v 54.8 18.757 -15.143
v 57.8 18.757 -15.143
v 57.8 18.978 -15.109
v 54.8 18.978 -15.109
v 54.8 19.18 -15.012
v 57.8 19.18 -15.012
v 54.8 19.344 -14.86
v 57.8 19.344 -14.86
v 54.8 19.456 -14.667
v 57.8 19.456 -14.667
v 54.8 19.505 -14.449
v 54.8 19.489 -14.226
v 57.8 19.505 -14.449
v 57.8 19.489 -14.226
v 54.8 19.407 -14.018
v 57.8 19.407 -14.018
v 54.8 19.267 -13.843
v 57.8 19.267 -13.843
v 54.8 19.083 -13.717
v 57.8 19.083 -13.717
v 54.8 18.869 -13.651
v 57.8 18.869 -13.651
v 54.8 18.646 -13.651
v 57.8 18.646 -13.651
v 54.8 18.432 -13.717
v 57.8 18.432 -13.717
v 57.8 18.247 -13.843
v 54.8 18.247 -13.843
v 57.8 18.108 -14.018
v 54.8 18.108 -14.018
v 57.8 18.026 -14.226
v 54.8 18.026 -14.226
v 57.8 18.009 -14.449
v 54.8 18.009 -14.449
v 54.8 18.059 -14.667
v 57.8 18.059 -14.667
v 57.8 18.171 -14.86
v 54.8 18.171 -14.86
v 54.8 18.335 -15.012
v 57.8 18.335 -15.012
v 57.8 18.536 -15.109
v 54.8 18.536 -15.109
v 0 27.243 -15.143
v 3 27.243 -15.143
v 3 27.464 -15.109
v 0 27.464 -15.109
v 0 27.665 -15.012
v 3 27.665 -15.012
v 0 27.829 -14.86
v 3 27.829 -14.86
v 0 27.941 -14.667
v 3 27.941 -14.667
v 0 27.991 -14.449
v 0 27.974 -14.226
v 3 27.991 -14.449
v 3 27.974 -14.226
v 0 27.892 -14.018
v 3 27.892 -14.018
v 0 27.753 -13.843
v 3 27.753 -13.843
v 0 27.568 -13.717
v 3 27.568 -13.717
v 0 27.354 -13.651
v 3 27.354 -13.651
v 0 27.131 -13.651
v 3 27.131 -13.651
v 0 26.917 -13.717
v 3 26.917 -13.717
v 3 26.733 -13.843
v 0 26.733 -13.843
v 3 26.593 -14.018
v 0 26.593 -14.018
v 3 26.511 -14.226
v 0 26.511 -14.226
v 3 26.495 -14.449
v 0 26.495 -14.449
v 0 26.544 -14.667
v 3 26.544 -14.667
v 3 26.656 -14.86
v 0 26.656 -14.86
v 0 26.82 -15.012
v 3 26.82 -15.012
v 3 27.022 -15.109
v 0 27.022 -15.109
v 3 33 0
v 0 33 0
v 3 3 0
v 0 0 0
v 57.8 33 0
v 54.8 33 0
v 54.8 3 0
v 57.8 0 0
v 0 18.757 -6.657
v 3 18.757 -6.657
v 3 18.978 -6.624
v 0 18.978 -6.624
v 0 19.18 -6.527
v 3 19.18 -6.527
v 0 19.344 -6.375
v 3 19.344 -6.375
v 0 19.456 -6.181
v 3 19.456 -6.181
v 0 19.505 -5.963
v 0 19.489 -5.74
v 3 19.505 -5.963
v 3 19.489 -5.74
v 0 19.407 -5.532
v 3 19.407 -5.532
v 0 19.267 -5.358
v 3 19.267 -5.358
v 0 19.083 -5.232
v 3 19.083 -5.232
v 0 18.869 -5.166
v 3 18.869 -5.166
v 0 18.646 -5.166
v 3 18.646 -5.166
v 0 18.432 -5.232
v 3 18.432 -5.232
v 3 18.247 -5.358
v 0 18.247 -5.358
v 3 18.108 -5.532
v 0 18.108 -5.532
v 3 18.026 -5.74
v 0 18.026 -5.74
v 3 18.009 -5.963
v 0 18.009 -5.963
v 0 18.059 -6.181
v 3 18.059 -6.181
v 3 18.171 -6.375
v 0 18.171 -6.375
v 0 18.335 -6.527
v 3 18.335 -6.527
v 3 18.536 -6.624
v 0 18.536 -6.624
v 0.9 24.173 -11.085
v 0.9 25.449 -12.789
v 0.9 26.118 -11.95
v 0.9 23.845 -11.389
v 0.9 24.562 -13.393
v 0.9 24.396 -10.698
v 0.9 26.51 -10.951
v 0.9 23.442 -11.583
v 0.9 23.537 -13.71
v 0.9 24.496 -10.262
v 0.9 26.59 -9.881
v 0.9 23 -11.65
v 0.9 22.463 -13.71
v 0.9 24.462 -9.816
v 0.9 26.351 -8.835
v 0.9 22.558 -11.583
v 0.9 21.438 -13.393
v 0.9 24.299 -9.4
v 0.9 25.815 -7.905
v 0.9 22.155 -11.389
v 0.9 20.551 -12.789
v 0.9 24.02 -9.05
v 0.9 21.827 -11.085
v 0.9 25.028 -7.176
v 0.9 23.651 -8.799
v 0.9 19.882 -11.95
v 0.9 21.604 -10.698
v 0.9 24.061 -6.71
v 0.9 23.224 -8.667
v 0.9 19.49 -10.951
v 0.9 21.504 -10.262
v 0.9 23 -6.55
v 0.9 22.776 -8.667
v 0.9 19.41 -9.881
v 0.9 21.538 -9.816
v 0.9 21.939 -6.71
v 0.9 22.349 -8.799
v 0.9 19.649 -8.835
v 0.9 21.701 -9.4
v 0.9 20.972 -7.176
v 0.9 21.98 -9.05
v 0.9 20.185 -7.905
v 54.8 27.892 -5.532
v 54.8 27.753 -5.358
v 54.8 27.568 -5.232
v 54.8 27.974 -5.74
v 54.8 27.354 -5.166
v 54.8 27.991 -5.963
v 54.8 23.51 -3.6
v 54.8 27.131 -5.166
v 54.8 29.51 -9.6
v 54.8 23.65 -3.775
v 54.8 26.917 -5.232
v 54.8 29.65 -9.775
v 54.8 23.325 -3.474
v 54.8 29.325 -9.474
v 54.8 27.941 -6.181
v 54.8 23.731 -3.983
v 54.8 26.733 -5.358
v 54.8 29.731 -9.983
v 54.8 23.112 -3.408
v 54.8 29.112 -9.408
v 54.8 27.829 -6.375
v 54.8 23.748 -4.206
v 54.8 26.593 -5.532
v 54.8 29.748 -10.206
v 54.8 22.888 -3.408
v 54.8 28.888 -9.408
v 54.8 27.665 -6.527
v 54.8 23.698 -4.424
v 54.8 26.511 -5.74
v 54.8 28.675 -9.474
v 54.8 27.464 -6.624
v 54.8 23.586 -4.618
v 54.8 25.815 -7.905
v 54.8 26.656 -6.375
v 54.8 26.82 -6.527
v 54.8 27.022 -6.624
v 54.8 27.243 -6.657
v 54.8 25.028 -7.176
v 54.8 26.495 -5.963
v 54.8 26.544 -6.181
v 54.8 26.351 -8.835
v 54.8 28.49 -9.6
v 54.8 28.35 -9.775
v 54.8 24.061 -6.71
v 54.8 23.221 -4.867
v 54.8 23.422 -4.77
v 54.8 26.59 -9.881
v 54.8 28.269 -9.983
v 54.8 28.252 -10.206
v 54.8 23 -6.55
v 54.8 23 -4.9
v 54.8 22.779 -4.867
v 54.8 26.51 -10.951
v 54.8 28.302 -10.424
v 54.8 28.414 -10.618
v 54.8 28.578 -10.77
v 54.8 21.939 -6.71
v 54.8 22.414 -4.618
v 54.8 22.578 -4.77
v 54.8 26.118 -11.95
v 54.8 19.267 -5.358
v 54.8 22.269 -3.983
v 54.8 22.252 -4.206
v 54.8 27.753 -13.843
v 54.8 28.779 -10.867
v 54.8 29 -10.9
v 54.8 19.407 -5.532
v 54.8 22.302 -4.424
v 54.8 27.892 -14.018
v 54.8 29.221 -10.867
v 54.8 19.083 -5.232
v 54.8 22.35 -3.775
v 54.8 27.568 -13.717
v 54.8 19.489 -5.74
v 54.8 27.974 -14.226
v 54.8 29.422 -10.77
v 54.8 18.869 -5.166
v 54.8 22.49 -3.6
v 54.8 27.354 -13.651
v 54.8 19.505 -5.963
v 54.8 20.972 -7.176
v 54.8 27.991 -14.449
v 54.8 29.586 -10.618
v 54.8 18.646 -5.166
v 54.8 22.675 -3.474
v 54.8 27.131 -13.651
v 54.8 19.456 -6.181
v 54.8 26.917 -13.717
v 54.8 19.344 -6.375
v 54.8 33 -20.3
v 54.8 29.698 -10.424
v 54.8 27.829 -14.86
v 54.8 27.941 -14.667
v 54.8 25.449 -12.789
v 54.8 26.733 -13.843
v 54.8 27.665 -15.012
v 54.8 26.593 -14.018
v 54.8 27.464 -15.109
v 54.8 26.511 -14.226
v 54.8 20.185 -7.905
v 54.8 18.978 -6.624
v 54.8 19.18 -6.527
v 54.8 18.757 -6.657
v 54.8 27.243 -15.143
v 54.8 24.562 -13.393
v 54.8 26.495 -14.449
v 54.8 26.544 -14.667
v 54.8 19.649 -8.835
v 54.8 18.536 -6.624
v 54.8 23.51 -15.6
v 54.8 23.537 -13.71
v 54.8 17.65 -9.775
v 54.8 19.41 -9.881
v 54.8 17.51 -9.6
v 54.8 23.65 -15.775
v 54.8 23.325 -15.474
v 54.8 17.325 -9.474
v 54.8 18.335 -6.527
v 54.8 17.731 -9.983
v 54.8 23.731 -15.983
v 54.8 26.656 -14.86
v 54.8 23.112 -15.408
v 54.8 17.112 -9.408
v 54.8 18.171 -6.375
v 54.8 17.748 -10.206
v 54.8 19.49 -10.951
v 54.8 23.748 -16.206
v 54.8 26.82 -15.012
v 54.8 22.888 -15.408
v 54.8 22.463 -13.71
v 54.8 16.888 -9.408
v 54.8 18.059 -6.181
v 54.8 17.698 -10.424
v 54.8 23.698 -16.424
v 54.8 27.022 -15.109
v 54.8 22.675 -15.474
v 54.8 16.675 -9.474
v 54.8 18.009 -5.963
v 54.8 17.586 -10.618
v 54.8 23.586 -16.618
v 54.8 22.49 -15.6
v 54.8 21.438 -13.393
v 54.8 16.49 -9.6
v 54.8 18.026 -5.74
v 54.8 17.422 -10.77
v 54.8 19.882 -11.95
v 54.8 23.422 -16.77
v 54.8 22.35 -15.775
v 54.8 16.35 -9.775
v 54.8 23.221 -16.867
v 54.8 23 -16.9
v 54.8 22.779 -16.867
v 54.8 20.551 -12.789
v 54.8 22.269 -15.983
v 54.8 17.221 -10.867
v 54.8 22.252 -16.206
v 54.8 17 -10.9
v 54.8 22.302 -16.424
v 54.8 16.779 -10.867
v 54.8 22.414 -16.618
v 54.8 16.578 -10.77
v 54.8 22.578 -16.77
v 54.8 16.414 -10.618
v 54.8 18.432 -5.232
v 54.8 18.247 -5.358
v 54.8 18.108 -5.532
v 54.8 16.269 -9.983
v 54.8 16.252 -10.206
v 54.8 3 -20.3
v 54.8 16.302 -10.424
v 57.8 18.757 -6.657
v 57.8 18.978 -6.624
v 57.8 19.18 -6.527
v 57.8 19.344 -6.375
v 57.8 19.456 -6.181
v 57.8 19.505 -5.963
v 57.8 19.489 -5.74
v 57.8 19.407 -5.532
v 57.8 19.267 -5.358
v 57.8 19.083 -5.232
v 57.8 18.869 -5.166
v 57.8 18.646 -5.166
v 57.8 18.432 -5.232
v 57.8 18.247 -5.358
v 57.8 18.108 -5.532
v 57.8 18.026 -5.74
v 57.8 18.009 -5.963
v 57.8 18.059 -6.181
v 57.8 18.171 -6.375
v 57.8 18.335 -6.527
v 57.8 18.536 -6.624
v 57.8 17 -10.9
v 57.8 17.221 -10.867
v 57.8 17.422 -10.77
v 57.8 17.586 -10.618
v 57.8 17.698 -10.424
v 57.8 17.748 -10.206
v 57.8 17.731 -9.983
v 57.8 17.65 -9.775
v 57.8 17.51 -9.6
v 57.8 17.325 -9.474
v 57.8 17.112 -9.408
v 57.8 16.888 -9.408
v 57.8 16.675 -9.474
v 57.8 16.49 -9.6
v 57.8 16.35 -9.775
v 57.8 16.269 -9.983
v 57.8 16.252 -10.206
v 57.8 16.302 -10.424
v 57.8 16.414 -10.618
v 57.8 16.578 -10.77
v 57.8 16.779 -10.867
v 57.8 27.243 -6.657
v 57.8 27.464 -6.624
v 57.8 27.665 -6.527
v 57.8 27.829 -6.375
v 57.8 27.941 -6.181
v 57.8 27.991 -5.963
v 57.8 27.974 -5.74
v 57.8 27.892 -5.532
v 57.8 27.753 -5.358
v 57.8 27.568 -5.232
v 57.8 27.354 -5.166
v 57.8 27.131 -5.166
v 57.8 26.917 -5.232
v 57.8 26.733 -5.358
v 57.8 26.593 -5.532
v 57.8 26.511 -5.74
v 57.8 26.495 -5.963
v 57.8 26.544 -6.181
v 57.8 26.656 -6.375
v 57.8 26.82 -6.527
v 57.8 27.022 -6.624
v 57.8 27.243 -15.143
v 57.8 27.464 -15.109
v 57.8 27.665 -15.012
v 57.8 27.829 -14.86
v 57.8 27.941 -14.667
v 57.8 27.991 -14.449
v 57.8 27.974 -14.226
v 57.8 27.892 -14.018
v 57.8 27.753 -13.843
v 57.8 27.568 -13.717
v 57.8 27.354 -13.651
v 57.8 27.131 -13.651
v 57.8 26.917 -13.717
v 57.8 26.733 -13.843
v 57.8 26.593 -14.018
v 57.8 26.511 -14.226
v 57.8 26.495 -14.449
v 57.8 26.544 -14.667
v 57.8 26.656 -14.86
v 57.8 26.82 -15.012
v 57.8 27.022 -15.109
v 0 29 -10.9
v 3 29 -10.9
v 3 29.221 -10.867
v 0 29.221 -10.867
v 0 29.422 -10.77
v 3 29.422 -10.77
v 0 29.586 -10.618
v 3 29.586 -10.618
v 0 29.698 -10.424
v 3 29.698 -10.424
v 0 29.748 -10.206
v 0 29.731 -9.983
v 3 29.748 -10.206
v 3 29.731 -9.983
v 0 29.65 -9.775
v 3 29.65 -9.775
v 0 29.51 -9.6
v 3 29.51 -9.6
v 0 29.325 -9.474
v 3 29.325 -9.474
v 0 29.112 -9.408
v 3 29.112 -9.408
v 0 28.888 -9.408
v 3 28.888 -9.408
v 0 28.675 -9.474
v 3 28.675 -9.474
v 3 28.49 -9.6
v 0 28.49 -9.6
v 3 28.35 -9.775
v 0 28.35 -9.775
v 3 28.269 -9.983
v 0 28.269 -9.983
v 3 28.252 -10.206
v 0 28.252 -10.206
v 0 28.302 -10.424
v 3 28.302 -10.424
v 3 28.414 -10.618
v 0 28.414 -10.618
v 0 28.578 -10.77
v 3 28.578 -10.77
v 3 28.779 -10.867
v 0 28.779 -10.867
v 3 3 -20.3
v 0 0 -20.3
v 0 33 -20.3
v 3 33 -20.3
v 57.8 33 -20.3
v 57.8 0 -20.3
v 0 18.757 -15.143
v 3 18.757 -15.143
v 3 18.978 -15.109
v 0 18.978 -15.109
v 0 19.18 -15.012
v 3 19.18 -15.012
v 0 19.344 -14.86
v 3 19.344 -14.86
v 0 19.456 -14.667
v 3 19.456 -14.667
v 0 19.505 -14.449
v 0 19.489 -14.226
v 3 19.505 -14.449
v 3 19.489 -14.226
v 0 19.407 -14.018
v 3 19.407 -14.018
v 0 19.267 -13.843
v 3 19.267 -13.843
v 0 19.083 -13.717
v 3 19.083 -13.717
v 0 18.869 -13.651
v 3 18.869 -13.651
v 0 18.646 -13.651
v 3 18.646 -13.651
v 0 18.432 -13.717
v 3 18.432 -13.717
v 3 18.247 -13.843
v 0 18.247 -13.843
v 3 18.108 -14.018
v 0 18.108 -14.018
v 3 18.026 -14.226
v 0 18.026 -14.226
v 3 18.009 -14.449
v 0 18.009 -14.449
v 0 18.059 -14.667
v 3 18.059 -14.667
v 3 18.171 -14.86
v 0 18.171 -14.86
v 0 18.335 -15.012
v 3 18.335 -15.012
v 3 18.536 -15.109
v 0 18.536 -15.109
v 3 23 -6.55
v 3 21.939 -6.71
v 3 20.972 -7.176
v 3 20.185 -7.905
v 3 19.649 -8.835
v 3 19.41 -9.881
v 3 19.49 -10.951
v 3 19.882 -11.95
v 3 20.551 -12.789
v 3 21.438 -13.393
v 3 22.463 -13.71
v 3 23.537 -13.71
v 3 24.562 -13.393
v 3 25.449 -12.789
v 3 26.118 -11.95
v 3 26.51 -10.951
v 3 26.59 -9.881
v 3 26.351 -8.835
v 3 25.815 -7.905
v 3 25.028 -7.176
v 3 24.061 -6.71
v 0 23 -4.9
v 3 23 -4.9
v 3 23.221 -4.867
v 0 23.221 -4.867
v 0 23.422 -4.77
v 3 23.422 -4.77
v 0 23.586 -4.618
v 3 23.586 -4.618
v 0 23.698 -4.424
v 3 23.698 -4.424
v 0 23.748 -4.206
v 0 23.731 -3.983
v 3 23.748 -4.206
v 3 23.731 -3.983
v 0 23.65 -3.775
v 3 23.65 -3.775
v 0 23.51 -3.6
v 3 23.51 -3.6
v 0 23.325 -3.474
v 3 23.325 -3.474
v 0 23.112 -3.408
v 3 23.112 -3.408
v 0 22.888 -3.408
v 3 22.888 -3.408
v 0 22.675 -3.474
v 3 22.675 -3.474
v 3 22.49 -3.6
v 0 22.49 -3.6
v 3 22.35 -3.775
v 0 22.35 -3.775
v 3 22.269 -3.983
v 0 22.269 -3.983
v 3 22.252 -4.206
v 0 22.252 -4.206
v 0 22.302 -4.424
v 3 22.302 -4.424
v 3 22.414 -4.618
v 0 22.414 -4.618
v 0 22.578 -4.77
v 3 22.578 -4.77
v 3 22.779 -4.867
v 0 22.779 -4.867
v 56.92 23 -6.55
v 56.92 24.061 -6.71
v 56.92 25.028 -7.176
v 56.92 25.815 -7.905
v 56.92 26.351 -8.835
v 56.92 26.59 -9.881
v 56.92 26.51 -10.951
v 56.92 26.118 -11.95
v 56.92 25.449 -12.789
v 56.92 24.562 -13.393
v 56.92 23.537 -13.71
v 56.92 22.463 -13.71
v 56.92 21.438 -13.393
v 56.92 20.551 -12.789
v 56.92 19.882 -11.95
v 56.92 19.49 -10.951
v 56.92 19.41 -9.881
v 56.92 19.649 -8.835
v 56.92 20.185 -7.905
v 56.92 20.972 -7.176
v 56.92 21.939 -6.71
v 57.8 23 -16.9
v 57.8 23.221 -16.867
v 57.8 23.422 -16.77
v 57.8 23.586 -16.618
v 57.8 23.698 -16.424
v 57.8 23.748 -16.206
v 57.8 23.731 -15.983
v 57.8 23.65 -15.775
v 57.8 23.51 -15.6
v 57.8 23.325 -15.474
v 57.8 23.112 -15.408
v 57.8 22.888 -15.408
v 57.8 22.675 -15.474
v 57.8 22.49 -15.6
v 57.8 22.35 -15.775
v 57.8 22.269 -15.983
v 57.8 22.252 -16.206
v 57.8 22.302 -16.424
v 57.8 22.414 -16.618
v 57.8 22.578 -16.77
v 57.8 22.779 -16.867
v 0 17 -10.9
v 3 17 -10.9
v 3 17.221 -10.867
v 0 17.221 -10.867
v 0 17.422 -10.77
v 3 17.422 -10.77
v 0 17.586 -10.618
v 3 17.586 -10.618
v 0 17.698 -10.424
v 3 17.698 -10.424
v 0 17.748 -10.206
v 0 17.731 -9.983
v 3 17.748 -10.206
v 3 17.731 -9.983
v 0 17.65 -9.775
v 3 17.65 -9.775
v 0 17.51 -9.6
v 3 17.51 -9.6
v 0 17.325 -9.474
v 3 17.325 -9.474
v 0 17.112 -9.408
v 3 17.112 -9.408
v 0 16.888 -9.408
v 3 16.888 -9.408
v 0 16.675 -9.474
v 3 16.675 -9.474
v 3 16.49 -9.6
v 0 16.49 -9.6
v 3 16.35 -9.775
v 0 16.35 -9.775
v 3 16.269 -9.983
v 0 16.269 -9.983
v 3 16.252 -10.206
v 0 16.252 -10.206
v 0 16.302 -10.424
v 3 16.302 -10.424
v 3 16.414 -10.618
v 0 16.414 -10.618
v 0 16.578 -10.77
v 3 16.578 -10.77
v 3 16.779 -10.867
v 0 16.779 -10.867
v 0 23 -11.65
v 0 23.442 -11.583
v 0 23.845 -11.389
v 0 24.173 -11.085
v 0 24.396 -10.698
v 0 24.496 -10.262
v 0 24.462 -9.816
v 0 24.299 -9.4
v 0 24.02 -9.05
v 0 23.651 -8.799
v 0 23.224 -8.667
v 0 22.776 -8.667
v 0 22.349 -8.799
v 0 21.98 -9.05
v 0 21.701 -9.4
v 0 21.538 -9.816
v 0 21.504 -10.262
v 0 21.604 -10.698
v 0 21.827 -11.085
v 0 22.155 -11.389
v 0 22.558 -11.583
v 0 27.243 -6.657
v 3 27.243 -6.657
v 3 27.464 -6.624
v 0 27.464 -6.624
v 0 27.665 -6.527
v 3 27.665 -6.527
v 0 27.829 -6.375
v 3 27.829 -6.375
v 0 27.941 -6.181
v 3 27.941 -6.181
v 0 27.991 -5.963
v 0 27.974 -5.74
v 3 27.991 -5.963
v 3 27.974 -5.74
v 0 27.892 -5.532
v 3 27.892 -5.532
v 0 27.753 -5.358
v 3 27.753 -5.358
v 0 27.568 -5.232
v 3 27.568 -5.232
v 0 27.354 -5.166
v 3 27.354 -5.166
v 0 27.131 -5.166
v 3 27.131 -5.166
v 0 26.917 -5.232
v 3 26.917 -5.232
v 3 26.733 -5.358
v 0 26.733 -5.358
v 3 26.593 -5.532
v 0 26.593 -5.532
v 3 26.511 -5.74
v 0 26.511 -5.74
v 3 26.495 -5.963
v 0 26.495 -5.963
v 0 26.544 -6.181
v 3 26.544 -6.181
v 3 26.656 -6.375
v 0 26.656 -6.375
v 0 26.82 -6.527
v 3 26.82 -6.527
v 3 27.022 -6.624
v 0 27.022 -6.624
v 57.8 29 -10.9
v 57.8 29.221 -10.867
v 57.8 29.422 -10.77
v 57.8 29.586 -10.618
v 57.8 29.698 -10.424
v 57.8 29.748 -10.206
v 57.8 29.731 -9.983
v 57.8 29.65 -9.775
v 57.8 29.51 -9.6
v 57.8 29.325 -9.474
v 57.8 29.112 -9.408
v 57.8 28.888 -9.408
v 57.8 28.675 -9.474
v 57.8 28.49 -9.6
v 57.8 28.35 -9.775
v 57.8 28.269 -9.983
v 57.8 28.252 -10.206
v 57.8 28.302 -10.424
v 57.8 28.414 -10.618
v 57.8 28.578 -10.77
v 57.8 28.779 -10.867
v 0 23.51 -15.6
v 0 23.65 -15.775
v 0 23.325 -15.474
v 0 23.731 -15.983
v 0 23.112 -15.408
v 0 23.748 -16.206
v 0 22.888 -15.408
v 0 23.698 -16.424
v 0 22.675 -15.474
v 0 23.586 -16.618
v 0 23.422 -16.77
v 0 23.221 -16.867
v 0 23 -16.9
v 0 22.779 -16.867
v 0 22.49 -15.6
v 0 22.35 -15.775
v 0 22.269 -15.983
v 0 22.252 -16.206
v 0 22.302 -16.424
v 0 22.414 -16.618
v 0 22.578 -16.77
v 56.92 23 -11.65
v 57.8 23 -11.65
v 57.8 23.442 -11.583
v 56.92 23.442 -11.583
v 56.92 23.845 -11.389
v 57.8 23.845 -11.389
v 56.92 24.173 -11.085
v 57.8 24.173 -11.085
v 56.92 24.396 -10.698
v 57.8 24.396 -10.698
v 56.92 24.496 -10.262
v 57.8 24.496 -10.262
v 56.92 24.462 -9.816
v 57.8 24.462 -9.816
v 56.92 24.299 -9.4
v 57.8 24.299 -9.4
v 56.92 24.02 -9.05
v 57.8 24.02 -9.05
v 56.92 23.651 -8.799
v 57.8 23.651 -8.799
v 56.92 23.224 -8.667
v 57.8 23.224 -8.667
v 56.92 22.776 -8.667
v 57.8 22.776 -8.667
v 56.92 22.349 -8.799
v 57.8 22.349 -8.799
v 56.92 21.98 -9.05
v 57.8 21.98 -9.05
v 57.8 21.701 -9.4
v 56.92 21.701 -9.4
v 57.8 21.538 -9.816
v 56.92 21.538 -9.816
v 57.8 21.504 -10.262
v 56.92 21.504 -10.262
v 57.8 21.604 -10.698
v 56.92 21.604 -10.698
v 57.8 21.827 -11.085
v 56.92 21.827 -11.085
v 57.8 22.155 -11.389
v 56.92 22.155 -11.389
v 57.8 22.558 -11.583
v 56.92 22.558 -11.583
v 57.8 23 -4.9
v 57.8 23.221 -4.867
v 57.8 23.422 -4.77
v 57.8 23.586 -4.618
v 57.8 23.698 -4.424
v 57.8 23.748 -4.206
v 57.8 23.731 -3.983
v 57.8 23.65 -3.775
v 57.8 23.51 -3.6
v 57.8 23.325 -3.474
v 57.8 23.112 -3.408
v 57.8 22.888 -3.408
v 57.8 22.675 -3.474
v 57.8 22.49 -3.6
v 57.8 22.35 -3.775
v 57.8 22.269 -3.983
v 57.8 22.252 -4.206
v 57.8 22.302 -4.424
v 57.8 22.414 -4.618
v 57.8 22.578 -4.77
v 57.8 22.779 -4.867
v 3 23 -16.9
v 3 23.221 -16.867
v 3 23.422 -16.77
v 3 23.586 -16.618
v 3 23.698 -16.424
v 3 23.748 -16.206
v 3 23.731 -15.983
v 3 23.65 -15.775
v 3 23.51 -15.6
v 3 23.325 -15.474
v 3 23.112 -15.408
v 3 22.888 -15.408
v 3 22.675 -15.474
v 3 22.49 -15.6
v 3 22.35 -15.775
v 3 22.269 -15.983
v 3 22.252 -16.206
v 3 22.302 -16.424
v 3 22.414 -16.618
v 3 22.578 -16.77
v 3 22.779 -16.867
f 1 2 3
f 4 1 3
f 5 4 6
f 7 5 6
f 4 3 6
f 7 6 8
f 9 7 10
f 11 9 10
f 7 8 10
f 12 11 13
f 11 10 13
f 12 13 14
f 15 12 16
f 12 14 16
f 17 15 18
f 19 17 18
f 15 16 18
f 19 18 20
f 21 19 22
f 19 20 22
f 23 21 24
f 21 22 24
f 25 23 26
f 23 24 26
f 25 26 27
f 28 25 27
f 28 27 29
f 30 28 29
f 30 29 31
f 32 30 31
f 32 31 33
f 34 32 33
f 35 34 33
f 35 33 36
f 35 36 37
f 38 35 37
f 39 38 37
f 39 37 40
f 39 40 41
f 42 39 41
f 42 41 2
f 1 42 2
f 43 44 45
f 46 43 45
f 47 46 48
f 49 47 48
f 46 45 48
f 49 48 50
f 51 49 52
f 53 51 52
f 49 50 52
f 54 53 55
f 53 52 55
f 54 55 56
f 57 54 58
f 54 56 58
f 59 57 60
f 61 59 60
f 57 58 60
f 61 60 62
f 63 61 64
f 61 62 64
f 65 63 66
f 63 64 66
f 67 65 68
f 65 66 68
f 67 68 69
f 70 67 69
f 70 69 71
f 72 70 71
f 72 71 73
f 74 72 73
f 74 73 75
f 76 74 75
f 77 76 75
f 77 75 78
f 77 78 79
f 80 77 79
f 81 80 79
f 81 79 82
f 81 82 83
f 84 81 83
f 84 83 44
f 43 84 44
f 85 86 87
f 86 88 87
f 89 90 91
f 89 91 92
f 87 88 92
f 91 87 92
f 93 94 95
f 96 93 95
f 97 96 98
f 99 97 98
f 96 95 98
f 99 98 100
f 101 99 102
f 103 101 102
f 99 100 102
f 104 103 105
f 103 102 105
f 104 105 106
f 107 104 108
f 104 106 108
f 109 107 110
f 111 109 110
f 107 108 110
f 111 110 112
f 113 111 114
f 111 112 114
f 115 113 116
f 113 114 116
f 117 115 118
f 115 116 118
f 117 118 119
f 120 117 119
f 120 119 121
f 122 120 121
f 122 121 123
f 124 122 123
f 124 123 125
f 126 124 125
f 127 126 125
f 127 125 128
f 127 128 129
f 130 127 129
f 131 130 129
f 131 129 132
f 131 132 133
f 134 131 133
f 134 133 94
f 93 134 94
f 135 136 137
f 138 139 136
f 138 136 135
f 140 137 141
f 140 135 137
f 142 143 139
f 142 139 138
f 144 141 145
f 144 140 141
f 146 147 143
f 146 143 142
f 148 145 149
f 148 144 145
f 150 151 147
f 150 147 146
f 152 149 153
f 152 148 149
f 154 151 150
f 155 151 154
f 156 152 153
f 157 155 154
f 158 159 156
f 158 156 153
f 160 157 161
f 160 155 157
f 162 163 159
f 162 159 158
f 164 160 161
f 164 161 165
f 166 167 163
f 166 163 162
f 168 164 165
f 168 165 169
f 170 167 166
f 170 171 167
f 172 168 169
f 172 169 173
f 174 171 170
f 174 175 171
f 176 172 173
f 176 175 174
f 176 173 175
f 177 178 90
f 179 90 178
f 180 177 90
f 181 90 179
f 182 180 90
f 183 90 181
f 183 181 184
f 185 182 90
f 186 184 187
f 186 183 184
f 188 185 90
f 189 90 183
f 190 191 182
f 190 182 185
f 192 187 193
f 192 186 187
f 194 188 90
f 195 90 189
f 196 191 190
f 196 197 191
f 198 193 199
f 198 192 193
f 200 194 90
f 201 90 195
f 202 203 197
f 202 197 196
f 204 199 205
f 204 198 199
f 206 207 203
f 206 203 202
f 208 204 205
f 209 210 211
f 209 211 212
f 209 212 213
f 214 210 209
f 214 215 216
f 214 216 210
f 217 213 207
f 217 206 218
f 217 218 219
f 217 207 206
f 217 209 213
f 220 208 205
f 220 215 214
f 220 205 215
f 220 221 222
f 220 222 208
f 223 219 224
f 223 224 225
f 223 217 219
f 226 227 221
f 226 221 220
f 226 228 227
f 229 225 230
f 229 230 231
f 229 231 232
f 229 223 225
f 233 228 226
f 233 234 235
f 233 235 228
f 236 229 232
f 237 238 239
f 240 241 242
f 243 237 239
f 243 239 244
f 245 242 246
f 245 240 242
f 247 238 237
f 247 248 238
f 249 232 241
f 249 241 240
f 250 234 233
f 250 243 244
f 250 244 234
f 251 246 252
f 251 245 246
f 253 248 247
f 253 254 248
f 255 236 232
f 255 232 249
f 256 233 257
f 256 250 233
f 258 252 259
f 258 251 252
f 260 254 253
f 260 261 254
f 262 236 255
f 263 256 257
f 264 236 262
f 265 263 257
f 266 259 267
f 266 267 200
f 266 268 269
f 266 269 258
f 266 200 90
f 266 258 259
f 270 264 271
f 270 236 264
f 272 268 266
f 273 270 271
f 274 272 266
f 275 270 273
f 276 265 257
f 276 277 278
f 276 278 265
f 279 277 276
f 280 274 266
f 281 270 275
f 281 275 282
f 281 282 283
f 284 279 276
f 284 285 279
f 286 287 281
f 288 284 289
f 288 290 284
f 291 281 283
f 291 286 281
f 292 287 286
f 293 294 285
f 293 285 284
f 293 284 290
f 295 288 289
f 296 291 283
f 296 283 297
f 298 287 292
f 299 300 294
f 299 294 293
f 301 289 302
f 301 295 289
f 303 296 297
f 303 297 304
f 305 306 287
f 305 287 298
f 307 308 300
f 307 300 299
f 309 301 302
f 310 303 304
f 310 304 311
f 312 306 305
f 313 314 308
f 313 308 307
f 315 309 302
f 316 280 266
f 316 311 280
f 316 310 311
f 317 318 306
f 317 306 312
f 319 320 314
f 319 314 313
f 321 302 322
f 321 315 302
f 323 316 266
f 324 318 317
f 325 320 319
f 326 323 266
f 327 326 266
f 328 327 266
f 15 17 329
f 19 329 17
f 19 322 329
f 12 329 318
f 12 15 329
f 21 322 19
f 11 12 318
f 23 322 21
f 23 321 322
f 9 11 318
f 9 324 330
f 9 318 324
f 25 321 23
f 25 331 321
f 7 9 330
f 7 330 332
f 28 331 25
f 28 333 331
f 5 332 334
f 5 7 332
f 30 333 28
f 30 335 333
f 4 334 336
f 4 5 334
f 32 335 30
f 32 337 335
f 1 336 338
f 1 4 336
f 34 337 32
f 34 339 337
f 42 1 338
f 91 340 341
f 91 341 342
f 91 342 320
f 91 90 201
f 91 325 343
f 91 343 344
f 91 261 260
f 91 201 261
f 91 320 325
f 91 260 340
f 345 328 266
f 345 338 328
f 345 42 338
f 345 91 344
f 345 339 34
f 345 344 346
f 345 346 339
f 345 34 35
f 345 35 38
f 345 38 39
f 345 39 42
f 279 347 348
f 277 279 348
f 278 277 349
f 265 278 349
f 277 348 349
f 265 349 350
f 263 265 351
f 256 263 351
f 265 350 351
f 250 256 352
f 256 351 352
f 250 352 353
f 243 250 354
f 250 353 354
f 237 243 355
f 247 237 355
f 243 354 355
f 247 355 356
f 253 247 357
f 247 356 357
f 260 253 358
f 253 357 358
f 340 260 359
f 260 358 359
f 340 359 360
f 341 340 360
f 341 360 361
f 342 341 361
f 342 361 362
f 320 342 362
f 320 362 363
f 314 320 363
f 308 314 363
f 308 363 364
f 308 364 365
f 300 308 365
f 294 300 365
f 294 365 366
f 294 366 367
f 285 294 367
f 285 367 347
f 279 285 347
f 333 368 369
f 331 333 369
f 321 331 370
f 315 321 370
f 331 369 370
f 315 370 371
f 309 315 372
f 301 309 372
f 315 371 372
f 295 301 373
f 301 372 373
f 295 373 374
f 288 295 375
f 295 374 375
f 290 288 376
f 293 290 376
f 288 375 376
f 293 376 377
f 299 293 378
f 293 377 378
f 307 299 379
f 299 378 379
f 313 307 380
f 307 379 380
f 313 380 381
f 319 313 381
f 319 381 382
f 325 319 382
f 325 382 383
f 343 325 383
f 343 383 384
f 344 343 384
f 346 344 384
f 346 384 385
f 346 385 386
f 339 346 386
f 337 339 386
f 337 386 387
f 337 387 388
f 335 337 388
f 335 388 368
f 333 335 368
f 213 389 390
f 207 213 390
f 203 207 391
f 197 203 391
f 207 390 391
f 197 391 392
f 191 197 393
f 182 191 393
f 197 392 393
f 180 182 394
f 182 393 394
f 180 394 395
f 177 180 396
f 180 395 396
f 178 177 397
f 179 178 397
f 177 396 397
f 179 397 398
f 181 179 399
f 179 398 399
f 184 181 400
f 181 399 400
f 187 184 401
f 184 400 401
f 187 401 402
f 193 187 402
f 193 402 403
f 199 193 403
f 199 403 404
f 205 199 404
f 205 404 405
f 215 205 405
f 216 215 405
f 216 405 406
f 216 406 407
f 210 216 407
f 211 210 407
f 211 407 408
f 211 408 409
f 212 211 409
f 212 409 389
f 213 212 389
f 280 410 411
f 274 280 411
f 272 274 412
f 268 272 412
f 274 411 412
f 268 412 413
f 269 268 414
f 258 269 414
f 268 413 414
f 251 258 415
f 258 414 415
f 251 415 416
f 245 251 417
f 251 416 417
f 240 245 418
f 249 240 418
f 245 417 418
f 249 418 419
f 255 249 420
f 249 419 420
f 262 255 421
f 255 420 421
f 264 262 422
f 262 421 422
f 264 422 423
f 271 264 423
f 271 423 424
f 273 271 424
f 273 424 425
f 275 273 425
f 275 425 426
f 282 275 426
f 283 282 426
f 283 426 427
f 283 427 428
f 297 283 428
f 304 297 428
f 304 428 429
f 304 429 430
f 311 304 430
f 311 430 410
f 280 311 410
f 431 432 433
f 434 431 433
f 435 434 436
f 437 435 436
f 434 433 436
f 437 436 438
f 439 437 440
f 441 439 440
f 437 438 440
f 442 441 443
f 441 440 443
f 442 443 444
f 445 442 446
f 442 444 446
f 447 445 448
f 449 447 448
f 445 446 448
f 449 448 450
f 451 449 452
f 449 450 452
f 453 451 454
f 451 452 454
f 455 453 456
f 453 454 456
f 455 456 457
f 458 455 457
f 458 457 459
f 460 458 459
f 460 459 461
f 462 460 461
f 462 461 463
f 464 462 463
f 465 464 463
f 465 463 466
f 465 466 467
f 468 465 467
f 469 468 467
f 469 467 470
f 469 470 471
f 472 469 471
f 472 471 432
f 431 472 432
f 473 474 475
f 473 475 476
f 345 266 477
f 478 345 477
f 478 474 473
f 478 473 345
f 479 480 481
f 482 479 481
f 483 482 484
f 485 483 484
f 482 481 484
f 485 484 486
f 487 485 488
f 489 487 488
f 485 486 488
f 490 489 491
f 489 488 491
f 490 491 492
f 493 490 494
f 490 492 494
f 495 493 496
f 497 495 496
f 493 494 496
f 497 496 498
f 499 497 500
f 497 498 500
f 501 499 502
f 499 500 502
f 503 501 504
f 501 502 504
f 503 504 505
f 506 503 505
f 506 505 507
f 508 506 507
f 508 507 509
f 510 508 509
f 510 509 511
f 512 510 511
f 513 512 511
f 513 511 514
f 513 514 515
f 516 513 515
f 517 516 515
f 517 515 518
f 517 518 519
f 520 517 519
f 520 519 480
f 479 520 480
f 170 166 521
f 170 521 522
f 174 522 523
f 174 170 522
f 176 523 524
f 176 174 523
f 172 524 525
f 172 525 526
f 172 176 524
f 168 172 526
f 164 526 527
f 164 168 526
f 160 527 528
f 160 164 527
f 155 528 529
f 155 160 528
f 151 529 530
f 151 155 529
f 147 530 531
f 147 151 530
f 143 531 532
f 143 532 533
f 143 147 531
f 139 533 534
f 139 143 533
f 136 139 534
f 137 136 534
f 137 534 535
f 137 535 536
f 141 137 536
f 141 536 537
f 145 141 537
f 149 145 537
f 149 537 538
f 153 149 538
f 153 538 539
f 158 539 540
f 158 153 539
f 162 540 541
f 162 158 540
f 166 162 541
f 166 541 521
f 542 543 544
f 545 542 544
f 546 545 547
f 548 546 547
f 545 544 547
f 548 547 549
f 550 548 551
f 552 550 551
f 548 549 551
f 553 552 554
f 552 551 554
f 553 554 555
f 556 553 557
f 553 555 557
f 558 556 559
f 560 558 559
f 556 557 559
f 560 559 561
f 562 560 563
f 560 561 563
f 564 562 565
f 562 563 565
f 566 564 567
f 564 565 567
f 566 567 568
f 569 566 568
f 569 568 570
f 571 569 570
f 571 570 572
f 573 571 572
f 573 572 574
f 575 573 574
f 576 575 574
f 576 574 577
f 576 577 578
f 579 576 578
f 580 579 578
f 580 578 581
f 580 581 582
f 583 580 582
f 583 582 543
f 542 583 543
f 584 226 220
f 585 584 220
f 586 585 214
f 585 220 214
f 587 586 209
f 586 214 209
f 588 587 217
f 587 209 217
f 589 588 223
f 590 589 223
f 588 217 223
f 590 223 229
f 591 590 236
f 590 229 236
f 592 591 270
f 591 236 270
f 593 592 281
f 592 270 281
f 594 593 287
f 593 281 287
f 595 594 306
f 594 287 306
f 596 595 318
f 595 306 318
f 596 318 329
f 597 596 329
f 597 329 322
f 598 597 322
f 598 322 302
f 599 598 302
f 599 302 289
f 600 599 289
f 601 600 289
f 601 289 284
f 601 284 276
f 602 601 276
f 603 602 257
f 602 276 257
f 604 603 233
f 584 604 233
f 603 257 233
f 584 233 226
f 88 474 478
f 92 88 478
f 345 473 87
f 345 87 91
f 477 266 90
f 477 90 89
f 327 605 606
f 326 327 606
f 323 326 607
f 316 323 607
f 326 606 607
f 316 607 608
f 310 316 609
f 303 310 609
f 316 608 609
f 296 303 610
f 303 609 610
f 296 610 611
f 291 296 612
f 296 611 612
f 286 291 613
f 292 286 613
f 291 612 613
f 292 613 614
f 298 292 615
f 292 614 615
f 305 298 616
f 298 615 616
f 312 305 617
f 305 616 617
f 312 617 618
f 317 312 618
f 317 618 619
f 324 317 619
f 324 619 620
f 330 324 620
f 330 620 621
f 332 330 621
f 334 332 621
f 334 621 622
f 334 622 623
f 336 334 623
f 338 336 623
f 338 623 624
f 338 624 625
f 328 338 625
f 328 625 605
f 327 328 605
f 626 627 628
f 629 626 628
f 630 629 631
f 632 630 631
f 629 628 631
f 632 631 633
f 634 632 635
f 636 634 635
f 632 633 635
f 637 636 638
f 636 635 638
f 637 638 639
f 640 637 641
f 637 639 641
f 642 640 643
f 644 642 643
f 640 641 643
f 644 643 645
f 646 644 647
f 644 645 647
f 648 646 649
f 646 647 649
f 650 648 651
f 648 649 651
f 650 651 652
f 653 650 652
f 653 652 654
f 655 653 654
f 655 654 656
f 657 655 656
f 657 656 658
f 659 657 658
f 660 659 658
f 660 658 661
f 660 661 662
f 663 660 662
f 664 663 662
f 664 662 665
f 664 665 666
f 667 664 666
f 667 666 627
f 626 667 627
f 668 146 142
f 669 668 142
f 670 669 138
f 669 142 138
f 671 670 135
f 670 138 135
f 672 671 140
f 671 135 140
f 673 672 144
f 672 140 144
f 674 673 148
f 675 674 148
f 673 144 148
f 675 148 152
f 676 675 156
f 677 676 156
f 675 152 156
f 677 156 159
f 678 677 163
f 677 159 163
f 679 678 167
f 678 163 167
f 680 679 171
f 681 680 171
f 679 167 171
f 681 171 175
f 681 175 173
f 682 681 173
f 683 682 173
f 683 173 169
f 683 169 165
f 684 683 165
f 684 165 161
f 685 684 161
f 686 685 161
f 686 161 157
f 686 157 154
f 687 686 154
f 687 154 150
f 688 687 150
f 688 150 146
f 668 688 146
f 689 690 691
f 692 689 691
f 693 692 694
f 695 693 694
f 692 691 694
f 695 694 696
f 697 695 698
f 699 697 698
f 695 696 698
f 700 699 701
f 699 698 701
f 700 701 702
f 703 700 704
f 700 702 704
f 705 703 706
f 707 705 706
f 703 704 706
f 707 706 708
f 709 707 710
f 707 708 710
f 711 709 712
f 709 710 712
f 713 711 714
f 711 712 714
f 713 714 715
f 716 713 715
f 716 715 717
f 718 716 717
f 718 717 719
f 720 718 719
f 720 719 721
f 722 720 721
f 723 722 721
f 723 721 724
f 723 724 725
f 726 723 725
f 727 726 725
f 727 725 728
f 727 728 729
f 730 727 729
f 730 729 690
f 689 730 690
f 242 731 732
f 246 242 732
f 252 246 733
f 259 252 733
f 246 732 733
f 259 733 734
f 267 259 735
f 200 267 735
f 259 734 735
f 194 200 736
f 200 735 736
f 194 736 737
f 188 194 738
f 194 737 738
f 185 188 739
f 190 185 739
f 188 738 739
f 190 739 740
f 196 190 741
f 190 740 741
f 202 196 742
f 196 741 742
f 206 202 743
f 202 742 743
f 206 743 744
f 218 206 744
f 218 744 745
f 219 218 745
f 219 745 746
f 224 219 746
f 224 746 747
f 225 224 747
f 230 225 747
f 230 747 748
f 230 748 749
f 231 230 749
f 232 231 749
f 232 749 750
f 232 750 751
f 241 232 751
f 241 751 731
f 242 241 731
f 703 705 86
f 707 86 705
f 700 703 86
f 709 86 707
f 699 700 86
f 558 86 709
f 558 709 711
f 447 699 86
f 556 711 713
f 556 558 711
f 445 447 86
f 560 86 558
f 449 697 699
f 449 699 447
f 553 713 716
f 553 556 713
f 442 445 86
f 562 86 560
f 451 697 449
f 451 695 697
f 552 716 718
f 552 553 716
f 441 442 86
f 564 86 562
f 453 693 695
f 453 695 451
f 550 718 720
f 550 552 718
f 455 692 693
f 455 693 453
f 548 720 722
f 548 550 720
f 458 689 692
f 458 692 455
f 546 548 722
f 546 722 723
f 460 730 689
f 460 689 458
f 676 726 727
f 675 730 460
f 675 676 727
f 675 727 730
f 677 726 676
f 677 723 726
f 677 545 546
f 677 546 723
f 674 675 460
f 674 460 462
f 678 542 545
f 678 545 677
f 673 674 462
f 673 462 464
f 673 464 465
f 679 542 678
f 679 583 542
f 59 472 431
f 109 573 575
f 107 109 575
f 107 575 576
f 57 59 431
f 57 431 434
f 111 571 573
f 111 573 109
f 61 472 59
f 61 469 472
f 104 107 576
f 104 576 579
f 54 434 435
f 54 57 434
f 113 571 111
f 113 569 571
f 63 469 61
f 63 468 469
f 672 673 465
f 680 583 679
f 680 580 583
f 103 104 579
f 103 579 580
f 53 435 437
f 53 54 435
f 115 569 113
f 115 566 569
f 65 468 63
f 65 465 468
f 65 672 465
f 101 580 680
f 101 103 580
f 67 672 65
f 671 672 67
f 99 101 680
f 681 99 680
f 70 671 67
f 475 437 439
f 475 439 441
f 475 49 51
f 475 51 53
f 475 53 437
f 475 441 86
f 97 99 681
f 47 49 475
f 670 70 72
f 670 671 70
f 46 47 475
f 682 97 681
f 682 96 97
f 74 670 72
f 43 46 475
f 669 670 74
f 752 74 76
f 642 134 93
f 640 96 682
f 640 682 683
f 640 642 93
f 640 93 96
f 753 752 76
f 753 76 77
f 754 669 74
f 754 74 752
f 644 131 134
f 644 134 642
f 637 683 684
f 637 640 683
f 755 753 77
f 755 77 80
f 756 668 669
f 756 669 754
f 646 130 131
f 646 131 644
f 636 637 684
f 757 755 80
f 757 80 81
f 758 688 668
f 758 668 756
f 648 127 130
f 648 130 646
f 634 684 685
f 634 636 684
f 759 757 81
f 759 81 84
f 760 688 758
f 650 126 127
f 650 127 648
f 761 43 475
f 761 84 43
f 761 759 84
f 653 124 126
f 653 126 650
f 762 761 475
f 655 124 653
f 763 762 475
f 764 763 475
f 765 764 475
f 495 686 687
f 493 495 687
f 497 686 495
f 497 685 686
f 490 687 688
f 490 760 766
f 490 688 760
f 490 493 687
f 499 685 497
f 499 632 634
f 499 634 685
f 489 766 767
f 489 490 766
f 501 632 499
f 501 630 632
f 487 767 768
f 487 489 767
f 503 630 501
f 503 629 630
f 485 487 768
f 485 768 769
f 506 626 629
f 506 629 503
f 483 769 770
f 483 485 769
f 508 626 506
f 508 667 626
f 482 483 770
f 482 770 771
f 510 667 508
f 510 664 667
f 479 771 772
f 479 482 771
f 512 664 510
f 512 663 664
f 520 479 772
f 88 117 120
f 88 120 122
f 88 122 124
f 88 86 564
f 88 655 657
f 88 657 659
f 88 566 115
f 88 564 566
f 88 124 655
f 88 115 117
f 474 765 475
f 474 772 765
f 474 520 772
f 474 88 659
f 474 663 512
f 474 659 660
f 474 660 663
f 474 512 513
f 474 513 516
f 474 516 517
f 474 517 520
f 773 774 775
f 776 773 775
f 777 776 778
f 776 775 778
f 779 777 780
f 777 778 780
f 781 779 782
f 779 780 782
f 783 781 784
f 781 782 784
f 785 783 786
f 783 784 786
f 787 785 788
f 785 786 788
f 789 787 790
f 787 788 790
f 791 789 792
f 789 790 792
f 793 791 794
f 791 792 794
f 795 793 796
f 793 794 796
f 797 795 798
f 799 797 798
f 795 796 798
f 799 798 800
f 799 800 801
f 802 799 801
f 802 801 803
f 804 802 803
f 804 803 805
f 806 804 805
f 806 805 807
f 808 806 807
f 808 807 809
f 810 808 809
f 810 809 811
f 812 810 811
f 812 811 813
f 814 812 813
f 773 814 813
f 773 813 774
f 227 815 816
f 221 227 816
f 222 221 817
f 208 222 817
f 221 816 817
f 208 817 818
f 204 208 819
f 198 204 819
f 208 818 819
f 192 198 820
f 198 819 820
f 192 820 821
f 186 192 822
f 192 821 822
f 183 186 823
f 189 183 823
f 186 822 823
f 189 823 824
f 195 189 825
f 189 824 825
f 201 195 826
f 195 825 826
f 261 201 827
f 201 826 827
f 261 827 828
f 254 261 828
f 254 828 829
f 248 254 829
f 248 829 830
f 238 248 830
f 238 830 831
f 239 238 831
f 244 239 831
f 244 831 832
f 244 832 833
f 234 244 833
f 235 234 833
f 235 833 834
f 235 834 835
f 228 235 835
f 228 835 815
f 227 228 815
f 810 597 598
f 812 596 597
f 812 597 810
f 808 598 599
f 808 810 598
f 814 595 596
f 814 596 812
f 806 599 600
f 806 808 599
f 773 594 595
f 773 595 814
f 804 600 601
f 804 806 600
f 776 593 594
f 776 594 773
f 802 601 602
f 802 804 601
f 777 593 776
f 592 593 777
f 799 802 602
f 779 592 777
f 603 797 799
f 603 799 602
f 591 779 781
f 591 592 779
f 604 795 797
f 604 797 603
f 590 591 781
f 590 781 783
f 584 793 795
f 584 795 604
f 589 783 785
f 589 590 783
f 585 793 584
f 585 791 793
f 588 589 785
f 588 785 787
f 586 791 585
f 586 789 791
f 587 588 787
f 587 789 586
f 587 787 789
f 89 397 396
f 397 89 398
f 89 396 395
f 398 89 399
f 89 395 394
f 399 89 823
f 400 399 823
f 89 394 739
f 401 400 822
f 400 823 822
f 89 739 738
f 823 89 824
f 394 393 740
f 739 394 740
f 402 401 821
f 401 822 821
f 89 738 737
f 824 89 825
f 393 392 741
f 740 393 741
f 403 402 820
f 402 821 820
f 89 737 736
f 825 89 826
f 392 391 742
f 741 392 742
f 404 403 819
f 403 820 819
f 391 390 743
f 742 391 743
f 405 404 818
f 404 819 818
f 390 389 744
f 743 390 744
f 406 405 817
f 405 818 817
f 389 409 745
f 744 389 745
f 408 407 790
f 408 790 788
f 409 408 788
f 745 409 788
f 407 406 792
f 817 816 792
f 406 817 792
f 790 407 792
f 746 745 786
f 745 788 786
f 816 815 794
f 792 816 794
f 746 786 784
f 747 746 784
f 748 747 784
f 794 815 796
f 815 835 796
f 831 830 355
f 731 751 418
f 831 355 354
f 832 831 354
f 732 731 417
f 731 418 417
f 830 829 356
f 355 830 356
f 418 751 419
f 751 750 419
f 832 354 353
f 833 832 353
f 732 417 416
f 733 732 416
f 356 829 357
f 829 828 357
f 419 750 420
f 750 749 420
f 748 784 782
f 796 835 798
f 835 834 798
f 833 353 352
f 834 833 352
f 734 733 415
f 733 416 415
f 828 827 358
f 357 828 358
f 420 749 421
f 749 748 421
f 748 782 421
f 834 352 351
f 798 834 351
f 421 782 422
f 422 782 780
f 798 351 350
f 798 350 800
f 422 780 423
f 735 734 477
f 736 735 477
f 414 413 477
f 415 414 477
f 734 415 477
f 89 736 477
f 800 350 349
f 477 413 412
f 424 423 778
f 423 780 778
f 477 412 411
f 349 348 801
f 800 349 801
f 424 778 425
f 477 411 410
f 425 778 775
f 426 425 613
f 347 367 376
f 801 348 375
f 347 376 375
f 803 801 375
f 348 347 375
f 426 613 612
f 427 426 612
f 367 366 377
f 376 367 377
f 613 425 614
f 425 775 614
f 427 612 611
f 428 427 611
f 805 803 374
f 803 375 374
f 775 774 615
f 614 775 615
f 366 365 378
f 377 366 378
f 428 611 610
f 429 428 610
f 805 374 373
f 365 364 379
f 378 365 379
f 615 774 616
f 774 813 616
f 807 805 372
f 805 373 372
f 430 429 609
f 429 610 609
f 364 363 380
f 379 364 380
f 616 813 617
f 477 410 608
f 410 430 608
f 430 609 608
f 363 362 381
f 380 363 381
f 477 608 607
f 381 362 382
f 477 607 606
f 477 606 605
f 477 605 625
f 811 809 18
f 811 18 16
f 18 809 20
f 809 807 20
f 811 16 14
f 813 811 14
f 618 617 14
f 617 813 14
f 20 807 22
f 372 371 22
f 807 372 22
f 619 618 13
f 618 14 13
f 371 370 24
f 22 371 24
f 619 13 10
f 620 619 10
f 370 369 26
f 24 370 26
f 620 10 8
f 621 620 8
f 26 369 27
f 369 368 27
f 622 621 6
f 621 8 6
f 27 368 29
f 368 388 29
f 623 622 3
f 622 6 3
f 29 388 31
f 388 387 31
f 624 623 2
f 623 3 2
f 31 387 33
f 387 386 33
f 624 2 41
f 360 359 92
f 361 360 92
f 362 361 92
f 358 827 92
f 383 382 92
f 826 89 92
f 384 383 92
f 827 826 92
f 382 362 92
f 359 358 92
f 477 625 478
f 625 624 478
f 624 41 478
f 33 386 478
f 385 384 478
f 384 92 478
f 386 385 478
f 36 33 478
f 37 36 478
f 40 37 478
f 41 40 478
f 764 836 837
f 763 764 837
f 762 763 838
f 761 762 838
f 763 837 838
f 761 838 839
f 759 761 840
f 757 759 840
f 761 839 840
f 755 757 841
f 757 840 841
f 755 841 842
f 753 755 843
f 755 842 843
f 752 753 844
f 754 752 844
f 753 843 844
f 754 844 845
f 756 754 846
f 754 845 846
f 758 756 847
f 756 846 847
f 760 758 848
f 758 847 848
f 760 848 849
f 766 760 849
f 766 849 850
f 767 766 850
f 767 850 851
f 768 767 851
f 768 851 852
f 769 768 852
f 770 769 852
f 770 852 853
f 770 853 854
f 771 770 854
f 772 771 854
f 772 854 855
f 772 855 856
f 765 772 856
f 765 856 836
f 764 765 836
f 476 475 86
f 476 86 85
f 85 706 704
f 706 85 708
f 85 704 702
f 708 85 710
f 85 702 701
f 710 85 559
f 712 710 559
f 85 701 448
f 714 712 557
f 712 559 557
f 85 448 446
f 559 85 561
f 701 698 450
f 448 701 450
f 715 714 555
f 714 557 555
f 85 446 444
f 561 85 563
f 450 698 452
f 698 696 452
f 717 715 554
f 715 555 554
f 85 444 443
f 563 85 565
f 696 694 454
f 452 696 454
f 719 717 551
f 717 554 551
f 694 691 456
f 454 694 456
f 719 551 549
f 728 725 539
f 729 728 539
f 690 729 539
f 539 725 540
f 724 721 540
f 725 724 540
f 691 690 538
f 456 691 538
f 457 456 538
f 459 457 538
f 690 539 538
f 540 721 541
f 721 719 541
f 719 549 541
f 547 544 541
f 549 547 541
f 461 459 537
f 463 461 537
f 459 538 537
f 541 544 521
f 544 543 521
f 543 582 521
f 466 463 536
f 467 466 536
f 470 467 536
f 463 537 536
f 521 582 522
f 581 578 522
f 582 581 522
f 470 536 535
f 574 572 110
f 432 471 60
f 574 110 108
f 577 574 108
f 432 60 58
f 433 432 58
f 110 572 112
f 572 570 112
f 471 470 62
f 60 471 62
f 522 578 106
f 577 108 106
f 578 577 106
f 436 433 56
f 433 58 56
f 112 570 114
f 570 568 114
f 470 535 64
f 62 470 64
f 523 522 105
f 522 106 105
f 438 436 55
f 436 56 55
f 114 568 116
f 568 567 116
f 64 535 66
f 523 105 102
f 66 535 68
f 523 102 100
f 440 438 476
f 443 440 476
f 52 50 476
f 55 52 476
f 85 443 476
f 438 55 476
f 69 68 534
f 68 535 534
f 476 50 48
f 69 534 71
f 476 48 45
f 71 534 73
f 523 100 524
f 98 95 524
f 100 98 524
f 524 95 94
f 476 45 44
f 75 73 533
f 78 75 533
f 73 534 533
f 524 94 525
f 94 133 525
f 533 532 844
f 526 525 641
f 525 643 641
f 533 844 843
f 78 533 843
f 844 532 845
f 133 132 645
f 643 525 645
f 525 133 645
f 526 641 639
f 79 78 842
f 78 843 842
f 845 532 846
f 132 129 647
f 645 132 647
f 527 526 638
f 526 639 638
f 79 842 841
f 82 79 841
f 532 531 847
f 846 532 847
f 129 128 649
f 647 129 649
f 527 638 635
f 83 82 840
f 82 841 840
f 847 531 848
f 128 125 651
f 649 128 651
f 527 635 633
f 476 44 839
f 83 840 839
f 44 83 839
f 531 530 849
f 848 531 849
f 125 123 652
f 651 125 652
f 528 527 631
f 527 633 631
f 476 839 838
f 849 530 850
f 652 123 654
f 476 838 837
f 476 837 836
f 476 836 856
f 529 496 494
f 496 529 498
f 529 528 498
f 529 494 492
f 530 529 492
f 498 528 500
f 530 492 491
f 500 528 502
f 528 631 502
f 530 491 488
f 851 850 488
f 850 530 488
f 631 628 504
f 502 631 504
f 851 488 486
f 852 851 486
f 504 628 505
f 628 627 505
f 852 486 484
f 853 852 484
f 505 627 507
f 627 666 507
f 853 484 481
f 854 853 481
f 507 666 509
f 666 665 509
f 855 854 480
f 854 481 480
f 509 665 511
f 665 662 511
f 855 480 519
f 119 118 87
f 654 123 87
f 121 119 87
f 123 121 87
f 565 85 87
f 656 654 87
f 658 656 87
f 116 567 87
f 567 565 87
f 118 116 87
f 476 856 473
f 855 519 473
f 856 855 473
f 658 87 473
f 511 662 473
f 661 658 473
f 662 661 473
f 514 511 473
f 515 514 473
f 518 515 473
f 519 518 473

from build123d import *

# Parameters (mm, degrees)
SKETCH1_W               = 57.8
SKETCH1_H               = 20.3
YAWMOUNT_DEPTH          = 3
SKETCH2_W               = 3
SKETCH2_H               = 20.3
BODYCONNECTORS_DEPTH    = 30
AXLE_MOUNTS_REACH       = 71.584
SKETCH3_R               = 1.5
SKETCH3_R_2             = 0.75
SKETCH4_R               = 3.6
SLIDE_COUNTERBORE_DEPTH = 2.12
GEAR_COUNTERBORE_START  = -2.1
SKETCH5_R               = 3.6
GEAR_COUNTERBORE_DEPTH  = 2.1


with BuildPart() as part:
    # Sketch1 → YawMount (new body)
    with BuildSketch(Plane(origin=(0, 0, 0), x_dir=(1, 0, 0), z_dir=(0, 1, 0))):
        with Locations((28.9, 10.15)):
            Rectangle(SKETCH1_W, SKETCH1_H)
    extrude(amount=YAWMOUNT_DEPTH)

    # Sketch2 → BodyConnectors (add)
    with BuildSketch(Plane(origin=(0, 3, 0), x_dir=(1, 0, 0), z_dir=(0, 1, 0))):
        with Locations((1.5, 10.15)):
            Rectangle(SKETCH2_W, SKETCH2_H)
        with Locations((56.3, 10.15)):
            Rectangle(SKETCH2_W, SKETCH2_H)
    extrude(amount=BODYCONNECTORS_DEPTH)

    # Axle-Mounts: up to this face of the body (flat: up to its plane)
    axle_mounts_end = Plane(part.part.faces().sort_by_distance((0, 16.5, -10.15))[0])
    # Sketch3 → Axle-Mounts (cut, up to the picked face)
    with BuildSketch(Plane(origin=(57.8, 0, 0), x_dir=(0, 0, -1), z_dir=(1, 0, 0)), mode=Mode.PRIVATE) as axle_mounts_sk1:
        with Locations((10.15, 23)):
            Circle(SKETCH3_R)
    axle_mounts_tool1 = split(extrude(axle_mounts_sk1.sketch, amount=-AXLE_MOUNTS_REACH, mode=Mode.PRIVATE), bisect_by=axle_mounts_end, keep=Keep.BOTH, mode=Mode.PRIVATE)
    # Sketch3 → Axle-Mounts (cut, up to the picked face)
    with BuildSketch(Plane(origin=(57.8, 0, 0), x_dir=(0, 0, -1), z_dir=(1, 0, 0)), mode=Mode.PRIVATE) as axle_mounts_sk2:
        with Locations((16.15, 23)):
            Circle(SKETCH3_R_2)
    axle_mounts_tool2 = split(extrude(axle_mounts_sk2.sketch, amount=-AXLE_MOUNTS_REACH, mode=Mode.PRIVATE), bisect_by=axle_mounts_end, keep=Keep.BOTH, mode=Mode.PRIVATE)
    # Sketch3 → Axle-Mounts (cut, up to the picked face)
    with BuildSketch(Plane(origin=(57.8, 0, 0), x_dir=(0, 0, -1), z_dir=(1, 0, 0)), mode=Mode.PRIVATE) as axle_mounts_sk3:
        with Locations((14.392640687, 18.757359313)):
            Circle(SKETCH3_R_2)
    axle_mounts_tool3 = split(extrude(axle_mounts_sk3.sketch, amount=-AXLE_MOUNTS_REACH, mode=Mode.PRIVATE), bisect_by=axle_mounts_end, keep=Keep.BOTH, mode=Mode.PRIVATE)
    # Sketch3 → Axle-Mounts (cut, up to the picked face)
    with BuildSketch(Plane(origin=(57.8, 0, 0), x_dir=(0, 0, -1), z_dir=(1, 0, 0)), mode=Mode.PRIVATE) as axle_mounts_sk4:
        with Locations((10.15, 17)):
            Circle(SKETCH3_R_2)
    axle_mounts_tool4 = split(extrude(axle_mounts_sk4.sketch, amount=-AXLE_MOUNTS_REACH, mode=Mode.PRIVATE), bisect_by=axle_mounts_end, keep=Keep.BOTH, mode=Mode.PRIVATE)
    # Sketch3 → Axle-Mounts (cut, up to the picked face)
    with BuildSketch(Plane(origin=(57.8, 0, 0), x_dir=(0, 0, -1), z_dir=(1, 0, 0)), mode=Mode.PRIVATE) as axle_mounts_sk5:
        with Locations((5.907359313, 18.757359313)):
            Circle(SKETCH3_R_2)
    axle_mounts_tool5 = split(extrude(axle_mounts_sk5.sketch, amount=-AXLE_MOUNTS_REACH, mode=Mode.PRIVATE), bisect_by=axle_mounts_end, keep=Keep.BOTH, mode=Mode.PRIVATE)
    # Sketch3 → Axle-Mounts (cut, up to the picked face)
    with BuildSketch(Plane(origin=(57.8, 0, 0), x_dir=(0, 0, -1), z_dir=(1, 0, 0)), mode=Mode.PRIVATE) as axle_mounts_sk6:
        with Locations((4.15, 23)):
            Circle(SKETCH3_R_2)
    axle_mounts_tool6 = split(extrude(axle_mounts_sk6.sketch, amount=-AXLE_MOUNTS_REACH, mode=Mode.PRIVATE), bisect_by=axle_mounts_end, keep=Keep.BOTH, mode=Mode.PRIVATE)
    # Sketch3 → Axle-Mounts (cut, up to the picked face)
    with BuildSketch(Plane(origin=(57.8, 0, 0), x_dir=(0, 0, -1), z_dir=(1, 0, 0)), mode=Mode.PRIVATE) as axle_mounts_sk7:
        with Locations((5.907359313, 27.242640687)):
            Circle(SKETCH3_R_2)
    axle_mounts_tool7 = split(extrude(axle_mounts_sk7.sketch, amount=-AXLE_MOUNTS_REACH, mode=Mode.PRIVATE), bisect_by=axle_mounts_end, keep=Keep.BOTH, mode=Mode.PRIVATE)
    # Sketch3 → Axle-Mounts (cut, up to the picked face)
    with BuildSketch(Plane(origin=(57.8, 0, 0), x_dir=(0, 0, -1), z_dir=(1, 0, 0)), mode=Mode.PRIVATE) as axle_mounts_sk8:
        with Locations((10.15, 29)):
            Circle(SKETCH3_R_2)
    axle_mounts_tool8 = split(extrude(axle_mounts_sk8.sketch, amount=-AXLE_MOUNTS_REACH, mode=Mode.PRIVATE), bisect_by=axle_mounts_end, keep=Keep.BOTH, mode=Mode.PRIVATE)
    # Sketch3 → Axle-Mounts (cut, up to the picked face)
    with BuildSketch(Plane(origin=(57.8, 0, 0), x_dir=(0, 0, -1), z_dir=(1, 0, 0)), mode=Mode.PRIVATE) as axle_mounts_sk9:
        with Locations((14.392640687, 27.242640687)):
            Circle(SKETCH3_R_2)
    axle_mounts_tool9 = split(extrude(axle_mounts_sk9.sketch, amount=-AXLE_MOUNTS_REACH, mode=Mode.PRIVATE), bisect_by=axle_mounts_end, keep=Keep.BOTH, mode=Mode.PRIVATE)
    add(axle_mounts_tool1.solids().sort_by(Axis((57.8, 23, -10.15), (-1, 0, 0)))[0], mode=Mode.SUBTRACT)
    add(axle_mounts_tool2.solids().sort_by(Axis((57.8, 23, -16.15), (-1, 0, 0)))[0], mode=Mode.SUBTRACT)
    add(axle_mounts_tool3.solids().sort_by(Axis((57.8, 18.757359, -14.392641), (-1, 0, 0)))[0], mode=Mode.SUBTRACT)
    add(axle_mounts_tool4.solids().sort_by(Axis((57.8, 17, -10.15), (-1, 0, 0)))[0], mode=Mode.SUBTRACT)
    add(axle_mounts_tool5.solids().sort_by(Axis((57.8, 18.757359, -5.907359), (-1, 0, 0)))[0], mode=Mode.SUBTRACT)
    add(axle_mounts_tool6.solids().sort_by(Axis((57.8, 23, -4.15), (-1, 0, 0)))[0], mode=Mode.SUBTRACT)
    add(axle_mounts_tool7.solids().sort_by(Axis((57.8, 27.242641, -5.907359), (-1, 0, 0)))[0], mode=Mode.SUBTRACT)
    add(axle_mounts_tool8.solids().sort_by(Axis((57.8, 29, -10.15), (-1, 0, 0)))[0], mode=Mode.SUBTRACT)
    add(axle_mounts_tool9.solids().sort_by(Axis((57.8, 27.242641, -14.392641), (-1, 0, 0)))[0], mode=Mode.SUBTRACT)

    # Sketch4 → Slide-Counterbore (cut)
    with BuildSketch(Plane.ZY.offset(-54.8)):
        with Locations((-10.15, 23)):
            Circle(SKETCH4_R)
    extrude(amount=-SLIDE_COUNTERBORE_DEPTH, mode=Mode.SUBTRACT)

    # Sketch5 → Gear-Counterbore (cut)
    with BuildSketch(Plane(origin=(3, 0, 0), x_dir=(0, 0, -1), z_dir=(1, 0, 0)).offset(GEAR_COUNTERBORE_START)):
        with Locations(Location((10.15, 23, 0), (0, 0, 180))):
            Circle(SKETCH5_R)
    extrude(amount=GEAR_COUNTERBORE_DEPTH, mode=Mode.SUBTRACT)


solid = part.part
